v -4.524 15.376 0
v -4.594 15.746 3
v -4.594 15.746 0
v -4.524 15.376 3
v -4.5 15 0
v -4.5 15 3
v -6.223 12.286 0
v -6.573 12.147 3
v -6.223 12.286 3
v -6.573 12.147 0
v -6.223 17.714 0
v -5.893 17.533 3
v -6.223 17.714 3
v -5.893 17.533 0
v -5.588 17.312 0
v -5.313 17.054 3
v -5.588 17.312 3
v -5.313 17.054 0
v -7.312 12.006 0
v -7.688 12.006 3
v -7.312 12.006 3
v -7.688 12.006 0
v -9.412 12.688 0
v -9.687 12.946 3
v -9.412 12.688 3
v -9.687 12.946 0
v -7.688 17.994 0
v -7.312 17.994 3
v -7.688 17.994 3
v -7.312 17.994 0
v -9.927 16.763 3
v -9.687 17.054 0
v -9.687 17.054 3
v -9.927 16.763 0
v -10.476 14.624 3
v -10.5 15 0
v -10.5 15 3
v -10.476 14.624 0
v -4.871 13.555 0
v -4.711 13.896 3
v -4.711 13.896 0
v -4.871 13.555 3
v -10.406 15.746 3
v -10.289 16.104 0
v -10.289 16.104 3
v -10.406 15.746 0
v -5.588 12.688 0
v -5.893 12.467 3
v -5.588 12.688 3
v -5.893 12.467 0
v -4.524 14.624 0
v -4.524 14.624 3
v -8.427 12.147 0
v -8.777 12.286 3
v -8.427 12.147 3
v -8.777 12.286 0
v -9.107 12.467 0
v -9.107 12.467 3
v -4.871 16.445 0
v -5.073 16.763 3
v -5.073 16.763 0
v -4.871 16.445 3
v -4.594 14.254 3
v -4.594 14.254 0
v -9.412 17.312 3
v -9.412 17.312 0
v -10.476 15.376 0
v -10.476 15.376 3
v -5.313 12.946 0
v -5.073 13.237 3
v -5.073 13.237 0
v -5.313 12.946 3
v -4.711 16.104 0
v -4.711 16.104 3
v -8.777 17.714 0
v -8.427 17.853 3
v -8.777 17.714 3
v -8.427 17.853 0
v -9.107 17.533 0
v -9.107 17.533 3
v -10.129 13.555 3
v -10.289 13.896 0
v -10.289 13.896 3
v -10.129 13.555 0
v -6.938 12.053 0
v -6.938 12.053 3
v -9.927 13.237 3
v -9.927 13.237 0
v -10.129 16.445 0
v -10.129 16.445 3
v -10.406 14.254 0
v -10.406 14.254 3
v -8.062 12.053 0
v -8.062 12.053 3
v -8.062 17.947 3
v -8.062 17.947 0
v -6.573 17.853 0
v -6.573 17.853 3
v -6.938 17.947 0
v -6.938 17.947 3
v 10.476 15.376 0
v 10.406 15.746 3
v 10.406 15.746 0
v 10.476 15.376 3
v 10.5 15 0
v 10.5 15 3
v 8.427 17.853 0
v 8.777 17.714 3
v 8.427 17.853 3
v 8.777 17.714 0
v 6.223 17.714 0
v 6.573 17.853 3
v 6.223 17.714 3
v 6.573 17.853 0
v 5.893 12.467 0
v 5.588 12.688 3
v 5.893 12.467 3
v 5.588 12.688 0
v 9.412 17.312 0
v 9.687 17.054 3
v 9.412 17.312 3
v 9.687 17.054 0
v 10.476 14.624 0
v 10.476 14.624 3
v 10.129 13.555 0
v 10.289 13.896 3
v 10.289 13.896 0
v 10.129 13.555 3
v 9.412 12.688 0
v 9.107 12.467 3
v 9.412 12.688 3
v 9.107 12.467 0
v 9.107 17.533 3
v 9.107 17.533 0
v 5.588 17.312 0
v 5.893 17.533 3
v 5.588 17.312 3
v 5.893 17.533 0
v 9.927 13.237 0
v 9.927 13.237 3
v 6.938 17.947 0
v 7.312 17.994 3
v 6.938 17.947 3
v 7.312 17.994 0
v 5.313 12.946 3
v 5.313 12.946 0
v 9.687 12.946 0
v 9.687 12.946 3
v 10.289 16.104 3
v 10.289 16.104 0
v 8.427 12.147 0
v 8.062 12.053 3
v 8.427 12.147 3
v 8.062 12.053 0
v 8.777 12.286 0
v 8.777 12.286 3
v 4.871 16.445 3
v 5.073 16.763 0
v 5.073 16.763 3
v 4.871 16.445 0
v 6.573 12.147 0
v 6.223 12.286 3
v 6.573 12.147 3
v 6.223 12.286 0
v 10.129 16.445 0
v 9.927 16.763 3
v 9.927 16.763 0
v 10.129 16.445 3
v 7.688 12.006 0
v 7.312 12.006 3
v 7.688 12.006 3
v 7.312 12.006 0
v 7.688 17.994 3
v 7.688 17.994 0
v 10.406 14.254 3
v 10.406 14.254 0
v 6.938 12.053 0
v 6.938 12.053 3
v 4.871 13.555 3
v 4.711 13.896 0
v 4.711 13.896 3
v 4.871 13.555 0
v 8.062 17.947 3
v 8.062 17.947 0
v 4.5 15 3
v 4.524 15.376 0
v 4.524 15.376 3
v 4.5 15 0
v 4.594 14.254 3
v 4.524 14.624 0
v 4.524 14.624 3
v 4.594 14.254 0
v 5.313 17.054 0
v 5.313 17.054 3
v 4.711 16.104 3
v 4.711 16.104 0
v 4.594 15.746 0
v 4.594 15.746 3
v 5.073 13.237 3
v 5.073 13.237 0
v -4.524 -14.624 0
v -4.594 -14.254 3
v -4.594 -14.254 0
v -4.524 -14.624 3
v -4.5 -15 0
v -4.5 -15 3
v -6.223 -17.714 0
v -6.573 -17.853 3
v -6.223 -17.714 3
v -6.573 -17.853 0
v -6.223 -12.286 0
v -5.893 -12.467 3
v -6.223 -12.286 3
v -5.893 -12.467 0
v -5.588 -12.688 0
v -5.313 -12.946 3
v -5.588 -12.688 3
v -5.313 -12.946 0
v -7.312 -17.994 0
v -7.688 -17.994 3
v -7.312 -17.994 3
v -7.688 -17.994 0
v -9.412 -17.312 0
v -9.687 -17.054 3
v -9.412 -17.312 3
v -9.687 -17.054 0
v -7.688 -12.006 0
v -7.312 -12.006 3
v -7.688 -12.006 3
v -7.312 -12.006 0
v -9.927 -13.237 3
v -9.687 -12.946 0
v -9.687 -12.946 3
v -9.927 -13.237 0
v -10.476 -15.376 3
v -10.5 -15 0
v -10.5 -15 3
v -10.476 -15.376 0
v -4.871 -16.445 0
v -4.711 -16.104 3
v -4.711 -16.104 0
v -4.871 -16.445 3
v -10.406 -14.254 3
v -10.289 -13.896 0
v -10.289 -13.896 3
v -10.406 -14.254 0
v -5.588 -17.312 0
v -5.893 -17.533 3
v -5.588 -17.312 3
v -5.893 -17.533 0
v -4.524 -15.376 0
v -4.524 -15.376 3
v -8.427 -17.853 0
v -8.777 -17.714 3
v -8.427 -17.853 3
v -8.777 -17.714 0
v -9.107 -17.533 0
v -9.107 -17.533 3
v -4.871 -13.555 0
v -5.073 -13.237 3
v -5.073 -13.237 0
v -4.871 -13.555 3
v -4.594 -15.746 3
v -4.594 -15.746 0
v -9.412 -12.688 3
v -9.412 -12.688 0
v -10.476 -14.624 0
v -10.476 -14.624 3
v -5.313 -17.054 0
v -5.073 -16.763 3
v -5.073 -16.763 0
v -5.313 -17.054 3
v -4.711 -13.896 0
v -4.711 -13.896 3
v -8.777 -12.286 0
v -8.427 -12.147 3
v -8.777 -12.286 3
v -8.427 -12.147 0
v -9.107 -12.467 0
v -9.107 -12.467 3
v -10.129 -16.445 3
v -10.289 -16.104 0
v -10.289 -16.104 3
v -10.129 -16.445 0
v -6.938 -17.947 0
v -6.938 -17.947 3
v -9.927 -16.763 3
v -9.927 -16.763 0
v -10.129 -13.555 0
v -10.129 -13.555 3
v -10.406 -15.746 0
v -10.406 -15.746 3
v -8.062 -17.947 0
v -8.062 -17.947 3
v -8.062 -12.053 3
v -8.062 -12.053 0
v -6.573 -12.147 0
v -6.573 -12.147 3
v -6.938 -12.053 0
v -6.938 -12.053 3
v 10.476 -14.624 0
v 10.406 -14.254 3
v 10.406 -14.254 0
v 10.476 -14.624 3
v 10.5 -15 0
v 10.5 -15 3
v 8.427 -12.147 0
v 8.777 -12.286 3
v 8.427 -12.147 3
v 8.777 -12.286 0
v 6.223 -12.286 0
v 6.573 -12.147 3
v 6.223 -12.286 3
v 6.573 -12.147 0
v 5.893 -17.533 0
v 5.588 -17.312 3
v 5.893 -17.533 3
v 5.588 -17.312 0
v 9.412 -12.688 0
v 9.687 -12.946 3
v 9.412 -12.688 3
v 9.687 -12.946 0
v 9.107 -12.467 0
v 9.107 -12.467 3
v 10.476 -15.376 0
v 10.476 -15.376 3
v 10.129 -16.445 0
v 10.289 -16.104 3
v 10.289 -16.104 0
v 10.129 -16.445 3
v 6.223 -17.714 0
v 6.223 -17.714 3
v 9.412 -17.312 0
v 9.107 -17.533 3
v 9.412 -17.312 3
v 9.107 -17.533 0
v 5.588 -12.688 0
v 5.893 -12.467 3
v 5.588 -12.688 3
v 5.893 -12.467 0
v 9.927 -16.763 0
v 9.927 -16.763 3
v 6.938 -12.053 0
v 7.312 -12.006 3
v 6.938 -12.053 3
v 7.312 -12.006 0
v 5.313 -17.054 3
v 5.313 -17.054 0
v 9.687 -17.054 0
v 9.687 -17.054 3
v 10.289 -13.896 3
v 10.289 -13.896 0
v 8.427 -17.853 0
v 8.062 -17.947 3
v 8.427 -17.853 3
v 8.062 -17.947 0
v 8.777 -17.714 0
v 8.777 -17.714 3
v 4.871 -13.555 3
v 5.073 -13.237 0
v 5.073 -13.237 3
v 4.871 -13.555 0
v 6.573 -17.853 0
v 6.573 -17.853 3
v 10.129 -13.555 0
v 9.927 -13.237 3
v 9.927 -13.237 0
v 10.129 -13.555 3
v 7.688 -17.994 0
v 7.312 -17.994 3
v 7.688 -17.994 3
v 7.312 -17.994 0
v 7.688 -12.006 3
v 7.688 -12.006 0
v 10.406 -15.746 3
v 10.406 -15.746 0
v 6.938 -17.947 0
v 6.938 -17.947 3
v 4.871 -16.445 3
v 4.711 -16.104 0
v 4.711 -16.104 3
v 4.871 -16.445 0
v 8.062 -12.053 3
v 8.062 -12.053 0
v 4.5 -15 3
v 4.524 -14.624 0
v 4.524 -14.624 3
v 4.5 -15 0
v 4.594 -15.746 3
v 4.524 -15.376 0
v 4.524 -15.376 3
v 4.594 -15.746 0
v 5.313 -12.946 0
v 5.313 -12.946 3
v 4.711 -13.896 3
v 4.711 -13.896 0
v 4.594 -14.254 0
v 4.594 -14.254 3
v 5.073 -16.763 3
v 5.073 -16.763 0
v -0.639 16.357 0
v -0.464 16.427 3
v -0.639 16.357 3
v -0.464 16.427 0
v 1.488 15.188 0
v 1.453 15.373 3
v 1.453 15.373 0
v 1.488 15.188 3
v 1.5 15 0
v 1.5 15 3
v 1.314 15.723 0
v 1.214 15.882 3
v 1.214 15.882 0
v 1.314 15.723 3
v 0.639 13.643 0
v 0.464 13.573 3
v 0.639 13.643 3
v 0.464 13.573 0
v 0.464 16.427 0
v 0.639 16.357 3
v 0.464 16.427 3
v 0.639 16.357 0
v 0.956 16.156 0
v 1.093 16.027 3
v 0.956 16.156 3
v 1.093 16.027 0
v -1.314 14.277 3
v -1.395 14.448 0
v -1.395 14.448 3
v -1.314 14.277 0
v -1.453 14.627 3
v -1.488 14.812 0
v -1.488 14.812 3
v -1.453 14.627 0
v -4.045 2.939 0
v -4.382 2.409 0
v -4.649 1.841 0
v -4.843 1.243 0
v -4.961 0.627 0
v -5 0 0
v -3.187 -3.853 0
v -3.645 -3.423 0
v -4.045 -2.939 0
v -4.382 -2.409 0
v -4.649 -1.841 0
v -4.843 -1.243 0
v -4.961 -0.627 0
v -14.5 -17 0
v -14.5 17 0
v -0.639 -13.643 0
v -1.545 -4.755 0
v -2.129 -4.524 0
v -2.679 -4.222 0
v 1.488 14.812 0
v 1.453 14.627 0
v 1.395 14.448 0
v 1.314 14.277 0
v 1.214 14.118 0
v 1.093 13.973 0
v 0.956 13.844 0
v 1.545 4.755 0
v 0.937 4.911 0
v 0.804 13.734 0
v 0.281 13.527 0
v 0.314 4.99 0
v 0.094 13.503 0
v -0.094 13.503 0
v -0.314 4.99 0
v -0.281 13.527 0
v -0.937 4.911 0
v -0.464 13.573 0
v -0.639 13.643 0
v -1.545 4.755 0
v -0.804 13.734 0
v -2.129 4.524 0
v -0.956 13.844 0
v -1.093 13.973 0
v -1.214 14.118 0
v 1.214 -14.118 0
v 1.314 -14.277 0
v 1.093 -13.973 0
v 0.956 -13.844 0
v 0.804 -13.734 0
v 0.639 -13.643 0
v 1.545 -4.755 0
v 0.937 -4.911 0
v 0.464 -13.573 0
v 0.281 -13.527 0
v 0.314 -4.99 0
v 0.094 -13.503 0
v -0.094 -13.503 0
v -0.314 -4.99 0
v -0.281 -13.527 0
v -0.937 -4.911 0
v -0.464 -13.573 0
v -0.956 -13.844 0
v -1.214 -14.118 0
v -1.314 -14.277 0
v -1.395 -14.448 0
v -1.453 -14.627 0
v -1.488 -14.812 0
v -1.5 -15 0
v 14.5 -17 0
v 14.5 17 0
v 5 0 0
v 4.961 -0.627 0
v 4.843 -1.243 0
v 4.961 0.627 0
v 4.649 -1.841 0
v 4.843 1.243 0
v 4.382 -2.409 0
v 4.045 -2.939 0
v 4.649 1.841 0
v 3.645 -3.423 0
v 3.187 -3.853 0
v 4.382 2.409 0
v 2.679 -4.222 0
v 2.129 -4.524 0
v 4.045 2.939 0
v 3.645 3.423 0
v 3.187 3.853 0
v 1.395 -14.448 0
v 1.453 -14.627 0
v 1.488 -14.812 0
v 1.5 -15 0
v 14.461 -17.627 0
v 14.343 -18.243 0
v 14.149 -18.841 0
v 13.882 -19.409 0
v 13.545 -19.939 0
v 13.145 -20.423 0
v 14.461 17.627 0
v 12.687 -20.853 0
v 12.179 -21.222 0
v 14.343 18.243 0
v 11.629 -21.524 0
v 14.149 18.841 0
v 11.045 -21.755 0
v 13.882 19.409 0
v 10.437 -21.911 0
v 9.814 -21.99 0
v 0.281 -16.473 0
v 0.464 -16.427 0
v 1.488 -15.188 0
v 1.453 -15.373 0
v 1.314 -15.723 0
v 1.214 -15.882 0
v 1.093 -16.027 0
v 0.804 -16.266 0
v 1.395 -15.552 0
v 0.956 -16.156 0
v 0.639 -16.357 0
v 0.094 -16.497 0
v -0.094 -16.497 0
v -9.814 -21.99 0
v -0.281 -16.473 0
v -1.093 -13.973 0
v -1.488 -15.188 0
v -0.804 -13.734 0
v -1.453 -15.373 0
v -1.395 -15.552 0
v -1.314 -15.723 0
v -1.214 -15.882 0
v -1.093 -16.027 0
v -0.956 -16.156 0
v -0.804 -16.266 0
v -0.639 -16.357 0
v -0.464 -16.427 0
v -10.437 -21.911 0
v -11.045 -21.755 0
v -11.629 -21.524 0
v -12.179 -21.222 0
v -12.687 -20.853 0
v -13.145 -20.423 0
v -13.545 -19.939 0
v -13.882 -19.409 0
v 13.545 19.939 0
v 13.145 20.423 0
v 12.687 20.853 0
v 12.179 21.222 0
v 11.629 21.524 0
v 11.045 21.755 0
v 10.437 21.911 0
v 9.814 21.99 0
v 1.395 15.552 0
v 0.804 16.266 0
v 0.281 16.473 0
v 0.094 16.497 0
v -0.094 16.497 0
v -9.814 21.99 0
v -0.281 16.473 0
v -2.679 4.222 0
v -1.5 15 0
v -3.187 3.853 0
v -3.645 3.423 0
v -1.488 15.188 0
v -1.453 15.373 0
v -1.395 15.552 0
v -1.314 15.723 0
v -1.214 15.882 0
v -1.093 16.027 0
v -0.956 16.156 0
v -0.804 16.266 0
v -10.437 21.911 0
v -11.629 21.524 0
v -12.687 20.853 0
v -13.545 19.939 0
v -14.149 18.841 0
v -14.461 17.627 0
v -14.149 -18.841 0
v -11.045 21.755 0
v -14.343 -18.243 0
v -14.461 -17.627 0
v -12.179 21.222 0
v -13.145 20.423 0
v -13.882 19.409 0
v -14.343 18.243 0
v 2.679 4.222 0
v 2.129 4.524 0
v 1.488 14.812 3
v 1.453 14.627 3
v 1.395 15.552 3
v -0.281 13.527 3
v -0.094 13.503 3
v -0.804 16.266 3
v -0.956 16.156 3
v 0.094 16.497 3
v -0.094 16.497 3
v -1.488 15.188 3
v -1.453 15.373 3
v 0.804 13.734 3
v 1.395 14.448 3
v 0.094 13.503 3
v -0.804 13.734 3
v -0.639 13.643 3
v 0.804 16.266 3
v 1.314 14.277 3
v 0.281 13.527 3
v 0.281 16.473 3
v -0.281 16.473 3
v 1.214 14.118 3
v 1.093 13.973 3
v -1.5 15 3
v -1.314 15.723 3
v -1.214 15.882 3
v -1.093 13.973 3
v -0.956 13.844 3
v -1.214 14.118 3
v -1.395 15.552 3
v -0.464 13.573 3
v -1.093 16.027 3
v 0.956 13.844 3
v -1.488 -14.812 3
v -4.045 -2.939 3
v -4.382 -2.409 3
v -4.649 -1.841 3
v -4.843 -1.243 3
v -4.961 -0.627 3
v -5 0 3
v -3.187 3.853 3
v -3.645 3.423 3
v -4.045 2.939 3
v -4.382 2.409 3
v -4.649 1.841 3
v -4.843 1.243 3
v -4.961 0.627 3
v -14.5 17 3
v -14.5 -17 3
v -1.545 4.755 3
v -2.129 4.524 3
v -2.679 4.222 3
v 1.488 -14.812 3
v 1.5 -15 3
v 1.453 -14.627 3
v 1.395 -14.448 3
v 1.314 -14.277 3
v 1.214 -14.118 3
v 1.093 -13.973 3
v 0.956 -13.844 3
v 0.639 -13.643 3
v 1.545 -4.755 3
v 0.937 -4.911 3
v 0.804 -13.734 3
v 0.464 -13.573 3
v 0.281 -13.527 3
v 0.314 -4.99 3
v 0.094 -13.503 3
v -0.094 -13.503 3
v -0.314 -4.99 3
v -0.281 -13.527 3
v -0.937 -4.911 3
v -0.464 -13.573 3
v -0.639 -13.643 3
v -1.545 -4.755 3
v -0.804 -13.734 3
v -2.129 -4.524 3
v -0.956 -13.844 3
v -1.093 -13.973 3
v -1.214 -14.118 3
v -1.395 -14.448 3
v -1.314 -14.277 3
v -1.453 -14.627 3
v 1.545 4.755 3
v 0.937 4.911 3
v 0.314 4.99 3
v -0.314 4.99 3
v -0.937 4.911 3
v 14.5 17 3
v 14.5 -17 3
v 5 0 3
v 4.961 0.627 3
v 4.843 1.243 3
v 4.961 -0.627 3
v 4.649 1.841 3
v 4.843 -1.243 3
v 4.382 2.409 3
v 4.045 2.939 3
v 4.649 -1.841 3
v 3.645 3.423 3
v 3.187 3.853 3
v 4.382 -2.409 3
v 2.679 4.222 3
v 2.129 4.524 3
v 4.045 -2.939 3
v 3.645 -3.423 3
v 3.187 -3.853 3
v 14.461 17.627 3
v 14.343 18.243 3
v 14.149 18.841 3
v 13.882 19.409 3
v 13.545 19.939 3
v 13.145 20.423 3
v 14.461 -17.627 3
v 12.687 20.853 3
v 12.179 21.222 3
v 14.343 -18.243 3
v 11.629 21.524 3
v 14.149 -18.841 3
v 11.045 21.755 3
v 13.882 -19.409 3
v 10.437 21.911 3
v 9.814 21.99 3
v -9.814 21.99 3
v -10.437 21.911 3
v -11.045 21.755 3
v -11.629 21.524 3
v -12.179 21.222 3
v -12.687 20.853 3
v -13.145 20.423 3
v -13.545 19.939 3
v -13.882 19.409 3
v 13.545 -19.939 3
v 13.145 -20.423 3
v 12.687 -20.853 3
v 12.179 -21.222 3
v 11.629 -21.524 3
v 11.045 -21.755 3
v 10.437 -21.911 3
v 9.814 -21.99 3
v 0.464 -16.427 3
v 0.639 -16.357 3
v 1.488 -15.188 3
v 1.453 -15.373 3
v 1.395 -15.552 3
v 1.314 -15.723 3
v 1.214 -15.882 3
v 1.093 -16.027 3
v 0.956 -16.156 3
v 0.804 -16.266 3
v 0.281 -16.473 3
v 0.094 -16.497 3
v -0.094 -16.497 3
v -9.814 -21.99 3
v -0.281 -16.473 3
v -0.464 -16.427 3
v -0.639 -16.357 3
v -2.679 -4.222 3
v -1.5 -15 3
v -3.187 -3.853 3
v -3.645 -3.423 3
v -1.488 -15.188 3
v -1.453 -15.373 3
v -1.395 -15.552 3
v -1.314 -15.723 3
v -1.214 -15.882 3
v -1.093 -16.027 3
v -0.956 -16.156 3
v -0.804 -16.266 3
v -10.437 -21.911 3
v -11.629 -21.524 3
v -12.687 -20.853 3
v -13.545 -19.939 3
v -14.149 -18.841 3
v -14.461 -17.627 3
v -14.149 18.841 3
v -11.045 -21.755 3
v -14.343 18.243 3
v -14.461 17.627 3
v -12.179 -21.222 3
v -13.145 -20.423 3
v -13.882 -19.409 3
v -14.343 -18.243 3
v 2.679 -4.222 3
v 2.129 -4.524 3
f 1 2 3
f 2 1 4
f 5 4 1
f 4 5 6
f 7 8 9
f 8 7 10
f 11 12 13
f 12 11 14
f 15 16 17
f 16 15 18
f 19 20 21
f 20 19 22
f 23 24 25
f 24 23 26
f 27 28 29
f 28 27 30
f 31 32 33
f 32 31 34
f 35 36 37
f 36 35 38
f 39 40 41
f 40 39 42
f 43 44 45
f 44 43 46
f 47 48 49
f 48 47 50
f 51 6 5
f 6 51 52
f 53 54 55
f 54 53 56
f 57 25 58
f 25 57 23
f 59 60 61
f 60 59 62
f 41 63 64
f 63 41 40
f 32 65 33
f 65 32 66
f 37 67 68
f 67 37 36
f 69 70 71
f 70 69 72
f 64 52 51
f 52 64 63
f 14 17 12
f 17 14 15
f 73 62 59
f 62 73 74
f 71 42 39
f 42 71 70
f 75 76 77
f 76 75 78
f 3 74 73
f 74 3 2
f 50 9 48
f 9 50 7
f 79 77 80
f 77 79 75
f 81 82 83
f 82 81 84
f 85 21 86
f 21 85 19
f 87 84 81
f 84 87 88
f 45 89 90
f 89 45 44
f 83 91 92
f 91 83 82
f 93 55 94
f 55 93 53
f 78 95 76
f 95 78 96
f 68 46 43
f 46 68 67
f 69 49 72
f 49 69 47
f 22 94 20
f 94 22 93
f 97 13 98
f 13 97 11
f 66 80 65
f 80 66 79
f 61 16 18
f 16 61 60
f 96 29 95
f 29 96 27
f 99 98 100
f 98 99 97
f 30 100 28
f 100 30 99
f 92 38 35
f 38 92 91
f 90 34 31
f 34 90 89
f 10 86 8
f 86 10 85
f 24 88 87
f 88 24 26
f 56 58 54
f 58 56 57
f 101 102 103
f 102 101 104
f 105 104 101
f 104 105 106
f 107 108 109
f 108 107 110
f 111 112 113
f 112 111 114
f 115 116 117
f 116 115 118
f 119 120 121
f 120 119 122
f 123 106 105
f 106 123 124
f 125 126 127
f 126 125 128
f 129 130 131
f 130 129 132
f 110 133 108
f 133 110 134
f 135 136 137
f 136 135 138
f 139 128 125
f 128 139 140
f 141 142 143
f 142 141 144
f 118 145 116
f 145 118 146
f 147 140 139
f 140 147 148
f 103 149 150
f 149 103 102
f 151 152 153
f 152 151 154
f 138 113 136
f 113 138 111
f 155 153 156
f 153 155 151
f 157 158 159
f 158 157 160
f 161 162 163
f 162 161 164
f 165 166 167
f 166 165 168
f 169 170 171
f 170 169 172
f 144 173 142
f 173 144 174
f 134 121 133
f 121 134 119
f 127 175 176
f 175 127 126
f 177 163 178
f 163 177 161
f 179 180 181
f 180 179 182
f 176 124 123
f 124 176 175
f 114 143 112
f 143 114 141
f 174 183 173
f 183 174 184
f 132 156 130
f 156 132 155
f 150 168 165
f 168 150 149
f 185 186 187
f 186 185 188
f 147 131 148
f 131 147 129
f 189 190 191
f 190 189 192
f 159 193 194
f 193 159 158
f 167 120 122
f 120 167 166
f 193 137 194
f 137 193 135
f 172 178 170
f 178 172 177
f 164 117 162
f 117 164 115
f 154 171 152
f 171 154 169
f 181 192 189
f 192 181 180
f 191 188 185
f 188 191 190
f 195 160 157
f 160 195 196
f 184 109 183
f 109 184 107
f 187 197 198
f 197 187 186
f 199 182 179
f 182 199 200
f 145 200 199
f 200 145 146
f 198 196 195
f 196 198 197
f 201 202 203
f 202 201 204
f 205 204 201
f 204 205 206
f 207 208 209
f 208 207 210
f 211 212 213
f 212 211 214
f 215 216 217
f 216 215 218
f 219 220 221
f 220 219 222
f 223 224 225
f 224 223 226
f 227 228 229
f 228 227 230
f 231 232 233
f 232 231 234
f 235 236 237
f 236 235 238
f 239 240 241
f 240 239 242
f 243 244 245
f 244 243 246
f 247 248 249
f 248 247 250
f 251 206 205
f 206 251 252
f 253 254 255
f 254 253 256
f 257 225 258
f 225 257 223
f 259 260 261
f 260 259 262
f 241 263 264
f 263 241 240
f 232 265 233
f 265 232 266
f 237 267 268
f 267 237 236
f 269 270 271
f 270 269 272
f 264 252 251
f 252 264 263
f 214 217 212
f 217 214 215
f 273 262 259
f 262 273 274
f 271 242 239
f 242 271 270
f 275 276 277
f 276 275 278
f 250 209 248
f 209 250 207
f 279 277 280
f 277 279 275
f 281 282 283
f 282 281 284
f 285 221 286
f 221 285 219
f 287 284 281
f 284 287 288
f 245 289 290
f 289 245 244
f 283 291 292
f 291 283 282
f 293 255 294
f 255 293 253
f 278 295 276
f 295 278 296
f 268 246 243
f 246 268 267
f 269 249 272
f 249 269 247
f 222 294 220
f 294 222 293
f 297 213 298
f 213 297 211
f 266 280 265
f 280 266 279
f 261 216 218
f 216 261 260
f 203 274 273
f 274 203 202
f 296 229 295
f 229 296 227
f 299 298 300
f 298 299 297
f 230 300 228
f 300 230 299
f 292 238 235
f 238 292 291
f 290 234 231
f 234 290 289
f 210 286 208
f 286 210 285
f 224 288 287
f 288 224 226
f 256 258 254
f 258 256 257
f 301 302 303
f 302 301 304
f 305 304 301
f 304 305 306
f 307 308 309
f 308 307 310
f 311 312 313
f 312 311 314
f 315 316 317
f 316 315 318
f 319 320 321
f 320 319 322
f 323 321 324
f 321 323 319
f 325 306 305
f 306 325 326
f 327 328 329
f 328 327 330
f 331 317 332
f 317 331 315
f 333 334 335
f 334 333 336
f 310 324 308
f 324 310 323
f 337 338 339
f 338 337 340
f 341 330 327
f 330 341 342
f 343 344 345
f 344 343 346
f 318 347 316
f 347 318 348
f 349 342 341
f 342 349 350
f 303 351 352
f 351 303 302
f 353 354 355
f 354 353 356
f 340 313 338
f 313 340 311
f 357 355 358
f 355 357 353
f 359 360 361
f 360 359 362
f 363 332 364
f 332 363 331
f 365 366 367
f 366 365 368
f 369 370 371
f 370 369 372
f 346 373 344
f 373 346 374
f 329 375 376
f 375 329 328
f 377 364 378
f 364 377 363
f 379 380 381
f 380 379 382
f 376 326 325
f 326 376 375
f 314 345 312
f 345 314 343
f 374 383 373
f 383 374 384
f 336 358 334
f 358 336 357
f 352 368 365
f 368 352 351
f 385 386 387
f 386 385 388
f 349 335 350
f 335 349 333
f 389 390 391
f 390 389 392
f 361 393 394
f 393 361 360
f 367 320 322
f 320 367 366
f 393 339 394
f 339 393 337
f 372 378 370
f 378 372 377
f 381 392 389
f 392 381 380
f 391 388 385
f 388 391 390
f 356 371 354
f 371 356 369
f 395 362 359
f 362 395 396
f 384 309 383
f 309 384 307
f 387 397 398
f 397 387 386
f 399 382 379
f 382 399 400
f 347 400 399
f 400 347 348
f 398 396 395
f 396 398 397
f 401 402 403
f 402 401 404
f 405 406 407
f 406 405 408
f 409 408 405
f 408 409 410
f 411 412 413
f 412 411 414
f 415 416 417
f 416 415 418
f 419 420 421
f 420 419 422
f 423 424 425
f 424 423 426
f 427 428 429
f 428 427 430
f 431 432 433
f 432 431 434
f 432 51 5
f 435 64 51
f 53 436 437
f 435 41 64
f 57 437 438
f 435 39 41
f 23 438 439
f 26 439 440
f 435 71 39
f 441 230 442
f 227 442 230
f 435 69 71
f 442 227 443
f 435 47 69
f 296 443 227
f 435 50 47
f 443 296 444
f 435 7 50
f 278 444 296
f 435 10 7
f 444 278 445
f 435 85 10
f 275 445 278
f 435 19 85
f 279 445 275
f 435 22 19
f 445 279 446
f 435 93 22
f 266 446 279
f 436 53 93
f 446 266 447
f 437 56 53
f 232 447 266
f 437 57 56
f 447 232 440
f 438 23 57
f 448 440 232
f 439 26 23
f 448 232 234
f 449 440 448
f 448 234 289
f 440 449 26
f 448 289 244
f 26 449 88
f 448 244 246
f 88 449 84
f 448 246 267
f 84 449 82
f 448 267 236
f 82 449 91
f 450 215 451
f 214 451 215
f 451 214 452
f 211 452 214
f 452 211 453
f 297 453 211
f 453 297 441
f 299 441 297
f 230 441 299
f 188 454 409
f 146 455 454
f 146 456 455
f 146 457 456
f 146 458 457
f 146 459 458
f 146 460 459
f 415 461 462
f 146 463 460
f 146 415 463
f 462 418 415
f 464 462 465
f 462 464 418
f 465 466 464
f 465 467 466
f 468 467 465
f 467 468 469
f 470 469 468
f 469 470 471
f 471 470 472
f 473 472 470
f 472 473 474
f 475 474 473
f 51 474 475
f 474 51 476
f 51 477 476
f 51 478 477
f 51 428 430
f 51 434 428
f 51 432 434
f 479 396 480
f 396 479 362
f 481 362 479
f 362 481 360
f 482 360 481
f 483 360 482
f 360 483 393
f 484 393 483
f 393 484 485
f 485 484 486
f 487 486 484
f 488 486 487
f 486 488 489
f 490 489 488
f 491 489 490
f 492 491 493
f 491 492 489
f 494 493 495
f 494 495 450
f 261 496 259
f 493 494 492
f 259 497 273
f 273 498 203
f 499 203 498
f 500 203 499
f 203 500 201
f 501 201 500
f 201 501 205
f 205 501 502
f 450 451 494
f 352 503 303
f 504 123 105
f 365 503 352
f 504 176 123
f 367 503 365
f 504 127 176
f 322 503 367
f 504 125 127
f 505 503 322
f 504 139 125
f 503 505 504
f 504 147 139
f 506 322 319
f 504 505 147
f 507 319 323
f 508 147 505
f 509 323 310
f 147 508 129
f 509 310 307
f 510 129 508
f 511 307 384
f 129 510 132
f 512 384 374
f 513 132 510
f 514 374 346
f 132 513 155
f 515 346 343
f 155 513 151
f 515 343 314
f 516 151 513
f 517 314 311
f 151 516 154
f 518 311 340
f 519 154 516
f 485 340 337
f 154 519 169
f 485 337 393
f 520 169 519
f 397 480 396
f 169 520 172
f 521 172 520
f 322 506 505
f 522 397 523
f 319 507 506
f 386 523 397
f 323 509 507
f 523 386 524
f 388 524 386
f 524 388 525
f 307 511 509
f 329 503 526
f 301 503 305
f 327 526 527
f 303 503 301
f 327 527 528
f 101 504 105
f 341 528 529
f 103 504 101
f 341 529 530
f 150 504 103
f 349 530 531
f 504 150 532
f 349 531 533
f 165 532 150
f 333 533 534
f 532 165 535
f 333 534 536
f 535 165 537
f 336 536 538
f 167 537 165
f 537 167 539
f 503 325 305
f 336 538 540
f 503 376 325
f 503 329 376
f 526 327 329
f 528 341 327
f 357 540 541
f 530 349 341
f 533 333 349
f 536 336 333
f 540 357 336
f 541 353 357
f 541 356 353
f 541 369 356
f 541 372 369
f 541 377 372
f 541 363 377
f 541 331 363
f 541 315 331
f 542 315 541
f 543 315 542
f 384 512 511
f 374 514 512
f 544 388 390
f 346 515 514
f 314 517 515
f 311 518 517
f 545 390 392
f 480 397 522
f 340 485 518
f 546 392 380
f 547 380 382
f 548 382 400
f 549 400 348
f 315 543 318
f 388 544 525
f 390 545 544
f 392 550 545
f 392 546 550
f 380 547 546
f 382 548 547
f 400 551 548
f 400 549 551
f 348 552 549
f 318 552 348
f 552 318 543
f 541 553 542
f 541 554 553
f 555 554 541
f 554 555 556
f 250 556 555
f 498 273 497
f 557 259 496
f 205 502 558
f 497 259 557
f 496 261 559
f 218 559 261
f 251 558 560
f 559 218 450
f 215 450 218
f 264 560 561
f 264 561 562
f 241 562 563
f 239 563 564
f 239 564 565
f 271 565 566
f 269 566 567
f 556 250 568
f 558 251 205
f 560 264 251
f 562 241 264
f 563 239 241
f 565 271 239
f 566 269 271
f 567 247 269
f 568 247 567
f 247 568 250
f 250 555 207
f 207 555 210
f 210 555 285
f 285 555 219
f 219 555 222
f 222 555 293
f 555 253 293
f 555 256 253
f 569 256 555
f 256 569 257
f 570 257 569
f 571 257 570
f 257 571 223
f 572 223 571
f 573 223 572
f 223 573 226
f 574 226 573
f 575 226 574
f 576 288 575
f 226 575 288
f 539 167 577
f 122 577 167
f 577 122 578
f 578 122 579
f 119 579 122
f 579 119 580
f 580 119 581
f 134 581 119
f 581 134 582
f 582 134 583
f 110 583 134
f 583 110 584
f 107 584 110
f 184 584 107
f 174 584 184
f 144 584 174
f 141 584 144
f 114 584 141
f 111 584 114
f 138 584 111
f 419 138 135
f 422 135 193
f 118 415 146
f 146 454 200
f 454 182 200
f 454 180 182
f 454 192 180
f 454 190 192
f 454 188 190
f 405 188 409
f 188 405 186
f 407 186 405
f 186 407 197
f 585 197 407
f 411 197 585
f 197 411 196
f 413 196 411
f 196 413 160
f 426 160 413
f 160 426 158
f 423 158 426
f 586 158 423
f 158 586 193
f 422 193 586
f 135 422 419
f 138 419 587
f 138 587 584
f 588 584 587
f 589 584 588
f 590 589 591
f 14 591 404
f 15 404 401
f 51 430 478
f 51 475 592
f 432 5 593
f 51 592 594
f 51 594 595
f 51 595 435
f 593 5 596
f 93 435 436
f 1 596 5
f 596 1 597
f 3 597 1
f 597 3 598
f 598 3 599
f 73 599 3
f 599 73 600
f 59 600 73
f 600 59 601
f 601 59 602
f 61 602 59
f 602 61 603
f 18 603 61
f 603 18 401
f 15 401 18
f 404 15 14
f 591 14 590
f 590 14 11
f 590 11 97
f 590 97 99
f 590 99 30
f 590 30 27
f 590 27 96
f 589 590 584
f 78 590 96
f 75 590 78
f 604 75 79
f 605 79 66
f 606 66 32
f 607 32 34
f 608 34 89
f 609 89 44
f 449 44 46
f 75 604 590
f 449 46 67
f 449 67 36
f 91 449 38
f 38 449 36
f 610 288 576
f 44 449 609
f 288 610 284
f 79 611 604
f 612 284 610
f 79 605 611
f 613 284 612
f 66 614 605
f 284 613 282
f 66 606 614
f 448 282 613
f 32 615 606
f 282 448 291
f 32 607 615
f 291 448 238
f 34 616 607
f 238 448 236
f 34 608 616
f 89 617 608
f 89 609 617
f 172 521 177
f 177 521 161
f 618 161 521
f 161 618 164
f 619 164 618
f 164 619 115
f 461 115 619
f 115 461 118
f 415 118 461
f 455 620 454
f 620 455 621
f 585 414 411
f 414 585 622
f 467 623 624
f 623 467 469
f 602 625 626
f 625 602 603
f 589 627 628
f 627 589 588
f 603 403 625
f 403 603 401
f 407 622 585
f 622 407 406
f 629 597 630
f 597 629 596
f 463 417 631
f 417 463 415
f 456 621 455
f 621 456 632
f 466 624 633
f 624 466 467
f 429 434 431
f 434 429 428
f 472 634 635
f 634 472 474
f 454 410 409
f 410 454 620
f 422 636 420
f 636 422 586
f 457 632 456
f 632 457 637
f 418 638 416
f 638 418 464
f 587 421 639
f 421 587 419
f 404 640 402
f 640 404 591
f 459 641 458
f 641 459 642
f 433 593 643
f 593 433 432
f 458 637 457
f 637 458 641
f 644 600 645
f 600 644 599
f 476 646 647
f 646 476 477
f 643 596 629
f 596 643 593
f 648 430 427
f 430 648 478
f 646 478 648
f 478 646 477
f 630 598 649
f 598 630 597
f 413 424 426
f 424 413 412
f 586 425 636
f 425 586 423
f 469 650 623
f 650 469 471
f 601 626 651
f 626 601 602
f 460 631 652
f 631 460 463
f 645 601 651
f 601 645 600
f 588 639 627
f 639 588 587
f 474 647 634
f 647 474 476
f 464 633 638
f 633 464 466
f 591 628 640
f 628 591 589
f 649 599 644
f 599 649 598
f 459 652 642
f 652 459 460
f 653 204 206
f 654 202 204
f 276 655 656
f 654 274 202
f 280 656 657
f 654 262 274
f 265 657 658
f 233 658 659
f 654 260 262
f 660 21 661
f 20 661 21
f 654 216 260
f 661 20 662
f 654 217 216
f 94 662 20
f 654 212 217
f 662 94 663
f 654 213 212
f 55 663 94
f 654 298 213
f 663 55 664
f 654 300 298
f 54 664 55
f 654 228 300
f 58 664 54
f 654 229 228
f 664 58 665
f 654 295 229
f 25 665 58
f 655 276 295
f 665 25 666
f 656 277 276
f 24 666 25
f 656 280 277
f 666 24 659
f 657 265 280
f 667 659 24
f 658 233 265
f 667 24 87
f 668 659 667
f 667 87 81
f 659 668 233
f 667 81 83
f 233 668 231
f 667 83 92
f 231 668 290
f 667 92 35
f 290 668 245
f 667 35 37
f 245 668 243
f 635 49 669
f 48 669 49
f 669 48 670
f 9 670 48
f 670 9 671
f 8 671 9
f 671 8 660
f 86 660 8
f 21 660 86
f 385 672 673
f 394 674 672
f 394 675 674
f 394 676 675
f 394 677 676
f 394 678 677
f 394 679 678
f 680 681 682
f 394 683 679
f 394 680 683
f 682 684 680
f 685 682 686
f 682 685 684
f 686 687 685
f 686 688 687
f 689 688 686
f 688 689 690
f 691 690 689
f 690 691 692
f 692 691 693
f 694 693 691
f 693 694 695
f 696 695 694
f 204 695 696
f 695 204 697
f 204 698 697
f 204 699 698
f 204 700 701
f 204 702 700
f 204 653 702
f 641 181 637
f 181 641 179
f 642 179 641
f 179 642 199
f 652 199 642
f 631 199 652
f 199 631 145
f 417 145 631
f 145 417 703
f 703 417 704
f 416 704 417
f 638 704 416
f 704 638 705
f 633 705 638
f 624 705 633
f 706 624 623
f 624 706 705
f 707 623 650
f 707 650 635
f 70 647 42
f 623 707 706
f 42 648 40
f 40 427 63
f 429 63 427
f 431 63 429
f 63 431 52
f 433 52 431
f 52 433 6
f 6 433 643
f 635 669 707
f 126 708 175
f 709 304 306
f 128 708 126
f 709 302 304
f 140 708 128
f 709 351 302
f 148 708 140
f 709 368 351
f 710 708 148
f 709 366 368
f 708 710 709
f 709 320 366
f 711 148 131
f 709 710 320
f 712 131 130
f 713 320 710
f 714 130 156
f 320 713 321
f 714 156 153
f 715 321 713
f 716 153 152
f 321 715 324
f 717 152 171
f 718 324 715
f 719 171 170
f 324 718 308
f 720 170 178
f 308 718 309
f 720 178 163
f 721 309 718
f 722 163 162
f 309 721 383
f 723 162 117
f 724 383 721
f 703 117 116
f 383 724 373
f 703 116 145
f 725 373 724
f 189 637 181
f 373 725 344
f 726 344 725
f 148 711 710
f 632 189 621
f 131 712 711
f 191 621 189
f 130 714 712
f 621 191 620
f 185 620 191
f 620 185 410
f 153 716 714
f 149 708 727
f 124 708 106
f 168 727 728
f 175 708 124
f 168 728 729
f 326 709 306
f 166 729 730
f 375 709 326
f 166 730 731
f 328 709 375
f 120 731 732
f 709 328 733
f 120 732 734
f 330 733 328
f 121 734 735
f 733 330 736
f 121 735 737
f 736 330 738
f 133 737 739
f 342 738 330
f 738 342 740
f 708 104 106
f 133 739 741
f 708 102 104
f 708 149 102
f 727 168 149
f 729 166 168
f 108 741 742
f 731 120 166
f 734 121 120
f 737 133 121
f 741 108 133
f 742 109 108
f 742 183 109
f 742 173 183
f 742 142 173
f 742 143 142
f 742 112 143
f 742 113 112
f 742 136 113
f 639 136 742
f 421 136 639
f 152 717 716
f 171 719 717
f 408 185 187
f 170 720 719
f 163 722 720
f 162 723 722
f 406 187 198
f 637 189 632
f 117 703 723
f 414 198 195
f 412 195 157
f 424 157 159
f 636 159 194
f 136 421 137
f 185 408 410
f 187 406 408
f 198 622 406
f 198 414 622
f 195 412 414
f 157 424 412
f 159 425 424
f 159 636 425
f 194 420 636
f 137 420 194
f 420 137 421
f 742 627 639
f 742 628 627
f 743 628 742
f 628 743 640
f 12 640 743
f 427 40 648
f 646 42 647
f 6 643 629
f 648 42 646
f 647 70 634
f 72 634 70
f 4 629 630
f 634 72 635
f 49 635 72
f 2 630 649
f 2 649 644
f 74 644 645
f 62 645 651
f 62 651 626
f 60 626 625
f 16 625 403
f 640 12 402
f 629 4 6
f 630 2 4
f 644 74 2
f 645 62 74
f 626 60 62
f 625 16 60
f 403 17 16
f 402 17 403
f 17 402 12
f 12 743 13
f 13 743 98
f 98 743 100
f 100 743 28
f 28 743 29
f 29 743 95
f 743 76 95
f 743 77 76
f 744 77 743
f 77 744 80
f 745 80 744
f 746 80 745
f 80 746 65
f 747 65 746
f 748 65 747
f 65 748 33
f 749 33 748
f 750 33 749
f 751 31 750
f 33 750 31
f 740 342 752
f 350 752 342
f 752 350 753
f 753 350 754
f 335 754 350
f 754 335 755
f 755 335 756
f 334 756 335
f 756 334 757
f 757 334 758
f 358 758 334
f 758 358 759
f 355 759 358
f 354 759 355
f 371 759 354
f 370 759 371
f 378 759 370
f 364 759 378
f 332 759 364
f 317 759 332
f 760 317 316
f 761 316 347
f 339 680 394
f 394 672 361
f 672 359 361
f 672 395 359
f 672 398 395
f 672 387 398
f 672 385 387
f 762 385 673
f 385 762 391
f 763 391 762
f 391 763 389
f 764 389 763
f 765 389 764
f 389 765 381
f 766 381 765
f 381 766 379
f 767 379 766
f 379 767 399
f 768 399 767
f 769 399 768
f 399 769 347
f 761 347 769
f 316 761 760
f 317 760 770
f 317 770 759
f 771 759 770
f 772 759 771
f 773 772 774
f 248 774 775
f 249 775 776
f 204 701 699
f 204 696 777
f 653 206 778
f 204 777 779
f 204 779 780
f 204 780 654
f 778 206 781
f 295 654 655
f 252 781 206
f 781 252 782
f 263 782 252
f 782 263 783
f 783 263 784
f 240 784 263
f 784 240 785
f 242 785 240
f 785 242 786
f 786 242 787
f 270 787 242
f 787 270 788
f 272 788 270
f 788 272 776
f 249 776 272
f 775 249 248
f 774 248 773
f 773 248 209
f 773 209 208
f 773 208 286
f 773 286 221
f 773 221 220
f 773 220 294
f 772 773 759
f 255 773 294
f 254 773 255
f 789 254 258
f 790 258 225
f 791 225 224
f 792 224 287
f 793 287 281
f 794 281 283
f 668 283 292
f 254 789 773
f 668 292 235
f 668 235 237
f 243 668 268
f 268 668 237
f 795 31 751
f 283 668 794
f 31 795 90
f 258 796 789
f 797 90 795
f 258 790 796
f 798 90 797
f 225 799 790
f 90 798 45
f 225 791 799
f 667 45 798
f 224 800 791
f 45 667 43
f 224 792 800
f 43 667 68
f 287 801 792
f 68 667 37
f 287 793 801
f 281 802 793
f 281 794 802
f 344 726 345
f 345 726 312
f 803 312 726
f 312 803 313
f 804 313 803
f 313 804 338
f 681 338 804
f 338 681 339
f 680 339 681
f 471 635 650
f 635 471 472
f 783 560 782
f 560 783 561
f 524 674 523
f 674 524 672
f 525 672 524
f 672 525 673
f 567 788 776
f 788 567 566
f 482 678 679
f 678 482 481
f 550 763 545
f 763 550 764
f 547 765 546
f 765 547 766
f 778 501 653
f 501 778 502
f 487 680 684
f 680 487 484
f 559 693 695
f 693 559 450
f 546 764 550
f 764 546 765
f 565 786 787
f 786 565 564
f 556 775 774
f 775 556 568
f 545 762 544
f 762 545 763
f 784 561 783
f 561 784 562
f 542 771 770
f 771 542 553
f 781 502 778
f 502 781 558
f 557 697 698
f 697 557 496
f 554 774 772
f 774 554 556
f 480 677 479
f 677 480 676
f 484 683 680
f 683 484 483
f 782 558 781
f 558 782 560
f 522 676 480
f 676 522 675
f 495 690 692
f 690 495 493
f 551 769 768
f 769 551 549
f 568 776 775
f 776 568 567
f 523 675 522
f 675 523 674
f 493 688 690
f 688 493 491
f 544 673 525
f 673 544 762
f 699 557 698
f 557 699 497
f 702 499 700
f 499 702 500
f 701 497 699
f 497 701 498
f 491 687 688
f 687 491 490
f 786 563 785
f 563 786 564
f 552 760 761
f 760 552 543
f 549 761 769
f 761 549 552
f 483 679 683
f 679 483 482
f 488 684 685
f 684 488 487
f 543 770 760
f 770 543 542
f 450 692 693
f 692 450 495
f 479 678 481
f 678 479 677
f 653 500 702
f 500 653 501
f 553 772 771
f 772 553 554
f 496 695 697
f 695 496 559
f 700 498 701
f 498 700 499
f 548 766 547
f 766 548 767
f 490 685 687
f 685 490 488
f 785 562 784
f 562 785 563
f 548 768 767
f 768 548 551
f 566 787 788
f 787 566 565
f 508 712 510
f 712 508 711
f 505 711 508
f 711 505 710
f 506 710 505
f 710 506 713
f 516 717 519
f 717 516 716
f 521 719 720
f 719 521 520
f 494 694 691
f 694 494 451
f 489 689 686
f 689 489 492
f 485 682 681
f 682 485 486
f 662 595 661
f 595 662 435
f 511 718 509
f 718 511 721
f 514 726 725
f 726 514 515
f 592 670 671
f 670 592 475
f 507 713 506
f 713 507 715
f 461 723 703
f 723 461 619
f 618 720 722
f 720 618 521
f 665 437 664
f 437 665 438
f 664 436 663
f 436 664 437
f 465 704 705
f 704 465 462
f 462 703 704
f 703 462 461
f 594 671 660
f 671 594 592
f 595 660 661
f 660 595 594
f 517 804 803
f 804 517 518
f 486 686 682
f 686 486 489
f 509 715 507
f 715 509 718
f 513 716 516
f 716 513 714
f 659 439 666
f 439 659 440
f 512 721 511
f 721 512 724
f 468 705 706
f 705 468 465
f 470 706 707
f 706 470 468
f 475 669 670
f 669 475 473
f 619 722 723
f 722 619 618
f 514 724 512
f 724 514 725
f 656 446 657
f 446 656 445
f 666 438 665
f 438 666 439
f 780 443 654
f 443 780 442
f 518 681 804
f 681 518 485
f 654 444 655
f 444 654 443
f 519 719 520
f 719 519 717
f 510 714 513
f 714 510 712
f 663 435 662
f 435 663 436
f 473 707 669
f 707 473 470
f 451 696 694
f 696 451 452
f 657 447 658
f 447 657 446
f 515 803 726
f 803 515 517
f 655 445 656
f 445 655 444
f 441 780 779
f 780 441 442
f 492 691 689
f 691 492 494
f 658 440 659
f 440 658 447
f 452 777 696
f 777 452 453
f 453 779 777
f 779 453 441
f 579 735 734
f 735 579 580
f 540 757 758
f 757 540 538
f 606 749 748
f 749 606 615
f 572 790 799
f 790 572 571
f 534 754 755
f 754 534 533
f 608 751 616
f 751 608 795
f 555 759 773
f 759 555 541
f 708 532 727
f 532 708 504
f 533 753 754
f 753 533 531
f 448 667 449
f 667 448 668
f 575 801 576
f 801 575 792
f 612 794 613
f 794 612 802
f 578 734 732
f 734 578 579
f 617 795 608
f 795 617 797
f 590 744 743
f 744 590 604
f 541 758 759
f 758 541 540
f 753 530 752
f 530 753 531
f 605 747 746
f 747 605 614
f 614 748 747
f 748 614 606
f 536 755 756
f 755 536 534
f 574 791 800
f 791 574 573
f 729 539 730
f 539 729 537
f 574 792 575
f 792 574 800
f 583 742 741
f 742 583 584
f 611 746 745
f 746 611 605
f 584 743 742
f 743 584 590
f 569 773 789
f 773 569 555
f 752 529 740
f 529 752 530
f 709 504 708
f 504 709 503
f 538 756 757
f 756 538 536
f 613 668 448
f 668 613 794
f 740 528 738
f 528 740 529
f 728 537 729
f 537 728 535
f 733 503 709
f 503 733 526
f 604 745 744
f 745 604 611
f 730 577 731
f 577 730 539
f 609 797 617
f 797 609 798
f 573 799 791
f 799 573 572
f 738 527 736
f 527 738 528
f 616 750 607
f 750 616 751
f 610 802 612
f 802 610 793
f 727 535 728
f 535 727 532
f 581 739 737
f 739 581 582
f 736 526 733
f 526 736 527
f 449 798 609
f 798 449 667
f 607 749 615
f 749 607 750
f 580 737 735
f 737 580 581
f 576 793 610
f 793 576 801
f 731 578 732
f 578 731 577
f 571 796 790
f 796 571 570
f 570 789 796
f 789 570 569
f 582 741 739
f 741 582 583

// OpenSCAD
$fn = 50;


difference() {
	union() {
		hull() {
			translate(v = [-9.5000000000, 17.0000000000, 0]) {
				cylinder(h = 3, r = 5);
			}
			translate(v = [9.5000000000, 17.0000000000, 0]) {
				cylinder(h = 3, r = 5);
			}
			translate(v = [-9.5000000000, -17.0000000000, 0]) {
				cylinder(h = 3, r = 5);
			}
			translate(v = [9.5000000000, -17.0000000000, 0]) {
				cylinder(h = 3, r = 5);
			}
		}
	}
	union() {
		#translate(v = [-7.5000000000, 15.0000000000, 0]) {
			cylinder(h = 3, r = 3.0000000000);
		}
		#translate(v = [7.5000000000, 15.0000000000, 0]) {
			cylinder(h = 3, r = 3.0000000000);
		}
		#translate(v = [-7.5000000000, -15.0000000000, 0]) {
			cylinder(h = 3, r = 3.0000000000);
		}
		#translate(v = [7.5000000000, -15.0000000000, 0]) {
			cylinder(h = 3, r = 3.0000000000);
		}
		#translate(v = [-7.5000000000, -15.0000000000, -100.0000000000]) {
			cylinder(h = 200, r = 3.0000000000);
		}
		#translate(v = [-7.5000000000, 15.0000000000, -100.0000000000]) {
			cylinder(h = 200, r = 3.0000000000);
		}
		#translate(v = [7.5000000000, -15.0000000000, -100.0000000000]) {
			cylinder(h = 200, r = 3.0000000000);
		}
		#translate(v = [7.5000000000, 15.0000000000, -100.0000000000]) {
			cylinder(h = 200, r = 3.0000000000);
		}
		#translate(v = [-7.5000000000, 15.0000000000, 0]) {
			cylinder(h = 3, r = 1.5000000000);
		}
		#translate(v = [0.0000000000, 15.0000000000, 0]) {
			cylinder(h = 3, r = 1.5000000000);
		}
		#translate(v = [7.5000000000, 15.0000000000, 0]) {
			cylinder(h = 3, r = 1.5000000000);
		}
		#translate(v = [-7.5000000000, -15.0000000000, 0]) {
			cylinder(h = 3, r = 1.5000000000);
		}
		#translate(v = [0.0000000000, -15.0000000000, 0]) {
			cylinder(h = 3, r = 1.5000000000);
		}
		#translate(v = [7.5000000000, -15.0000000000, 0]) {
			cylinder(h = 3, r = 1.5000000000);
		}
		#translate(v = [-7.5000000000, 15.0000000000, 0]) {
			cylinder(h = 3, r = 1.5000000000);
		}
		#translate(v = [0.0000000000, 15.0000000000, 0]) {
			cylinder(h = 3, r = 1.5000000000);
		}
		#translate(v = [7.5000000000, 15.0000000000, 0]) {
			cylinder(h = 3, r = 1.5000000000);
		}
		#translate(v = [-7.5000000000, -15.0000000000, 0]) {
			cylinder(h = 3, r = 1.5000000000);
		}
		#translate(v = [0.0000000000, -15.0000000000, 0]) {
			cylinder(h = 3, r = 1.5000000000);
		}
		#translate(v = [7.5000000000, -15.0000000000, 0]) {
			cylinder(h = 3, r = 1.5000000000);
		}
		#translate(v = [-7.5000000000, 15.0000000000, 0]) {
			cylinder(h = 3, r = 1.5000000000);
		}
		#translate(v = [0.0000000000, 15.0000000000, 0]) {
			cylinder(h = 3, r = 1.5000000000);
		}
		#translate(v = [7.5000000000, 15.0000000000, 0]) {
			cylinder(h = 3, r = 1.5000000000);
		}
		#translate(v = [-7.5000000000, -15.0000000000, 0]) {
			cylinder(h = 3, r = 1.5000000000);
		}
		#translate(v = [0.0000000000, -15.0000000000, 0]) {
			cylinder(h = 3, r = 1.5000000000);
		}
		#translate(v = [7.5000000000, -15.0000000000, 0]) {
			cylinder(h = 3, r = 1.5000000000);
		}
		#cylinder(h = 3, r = 5.0000000000);
	}
}
